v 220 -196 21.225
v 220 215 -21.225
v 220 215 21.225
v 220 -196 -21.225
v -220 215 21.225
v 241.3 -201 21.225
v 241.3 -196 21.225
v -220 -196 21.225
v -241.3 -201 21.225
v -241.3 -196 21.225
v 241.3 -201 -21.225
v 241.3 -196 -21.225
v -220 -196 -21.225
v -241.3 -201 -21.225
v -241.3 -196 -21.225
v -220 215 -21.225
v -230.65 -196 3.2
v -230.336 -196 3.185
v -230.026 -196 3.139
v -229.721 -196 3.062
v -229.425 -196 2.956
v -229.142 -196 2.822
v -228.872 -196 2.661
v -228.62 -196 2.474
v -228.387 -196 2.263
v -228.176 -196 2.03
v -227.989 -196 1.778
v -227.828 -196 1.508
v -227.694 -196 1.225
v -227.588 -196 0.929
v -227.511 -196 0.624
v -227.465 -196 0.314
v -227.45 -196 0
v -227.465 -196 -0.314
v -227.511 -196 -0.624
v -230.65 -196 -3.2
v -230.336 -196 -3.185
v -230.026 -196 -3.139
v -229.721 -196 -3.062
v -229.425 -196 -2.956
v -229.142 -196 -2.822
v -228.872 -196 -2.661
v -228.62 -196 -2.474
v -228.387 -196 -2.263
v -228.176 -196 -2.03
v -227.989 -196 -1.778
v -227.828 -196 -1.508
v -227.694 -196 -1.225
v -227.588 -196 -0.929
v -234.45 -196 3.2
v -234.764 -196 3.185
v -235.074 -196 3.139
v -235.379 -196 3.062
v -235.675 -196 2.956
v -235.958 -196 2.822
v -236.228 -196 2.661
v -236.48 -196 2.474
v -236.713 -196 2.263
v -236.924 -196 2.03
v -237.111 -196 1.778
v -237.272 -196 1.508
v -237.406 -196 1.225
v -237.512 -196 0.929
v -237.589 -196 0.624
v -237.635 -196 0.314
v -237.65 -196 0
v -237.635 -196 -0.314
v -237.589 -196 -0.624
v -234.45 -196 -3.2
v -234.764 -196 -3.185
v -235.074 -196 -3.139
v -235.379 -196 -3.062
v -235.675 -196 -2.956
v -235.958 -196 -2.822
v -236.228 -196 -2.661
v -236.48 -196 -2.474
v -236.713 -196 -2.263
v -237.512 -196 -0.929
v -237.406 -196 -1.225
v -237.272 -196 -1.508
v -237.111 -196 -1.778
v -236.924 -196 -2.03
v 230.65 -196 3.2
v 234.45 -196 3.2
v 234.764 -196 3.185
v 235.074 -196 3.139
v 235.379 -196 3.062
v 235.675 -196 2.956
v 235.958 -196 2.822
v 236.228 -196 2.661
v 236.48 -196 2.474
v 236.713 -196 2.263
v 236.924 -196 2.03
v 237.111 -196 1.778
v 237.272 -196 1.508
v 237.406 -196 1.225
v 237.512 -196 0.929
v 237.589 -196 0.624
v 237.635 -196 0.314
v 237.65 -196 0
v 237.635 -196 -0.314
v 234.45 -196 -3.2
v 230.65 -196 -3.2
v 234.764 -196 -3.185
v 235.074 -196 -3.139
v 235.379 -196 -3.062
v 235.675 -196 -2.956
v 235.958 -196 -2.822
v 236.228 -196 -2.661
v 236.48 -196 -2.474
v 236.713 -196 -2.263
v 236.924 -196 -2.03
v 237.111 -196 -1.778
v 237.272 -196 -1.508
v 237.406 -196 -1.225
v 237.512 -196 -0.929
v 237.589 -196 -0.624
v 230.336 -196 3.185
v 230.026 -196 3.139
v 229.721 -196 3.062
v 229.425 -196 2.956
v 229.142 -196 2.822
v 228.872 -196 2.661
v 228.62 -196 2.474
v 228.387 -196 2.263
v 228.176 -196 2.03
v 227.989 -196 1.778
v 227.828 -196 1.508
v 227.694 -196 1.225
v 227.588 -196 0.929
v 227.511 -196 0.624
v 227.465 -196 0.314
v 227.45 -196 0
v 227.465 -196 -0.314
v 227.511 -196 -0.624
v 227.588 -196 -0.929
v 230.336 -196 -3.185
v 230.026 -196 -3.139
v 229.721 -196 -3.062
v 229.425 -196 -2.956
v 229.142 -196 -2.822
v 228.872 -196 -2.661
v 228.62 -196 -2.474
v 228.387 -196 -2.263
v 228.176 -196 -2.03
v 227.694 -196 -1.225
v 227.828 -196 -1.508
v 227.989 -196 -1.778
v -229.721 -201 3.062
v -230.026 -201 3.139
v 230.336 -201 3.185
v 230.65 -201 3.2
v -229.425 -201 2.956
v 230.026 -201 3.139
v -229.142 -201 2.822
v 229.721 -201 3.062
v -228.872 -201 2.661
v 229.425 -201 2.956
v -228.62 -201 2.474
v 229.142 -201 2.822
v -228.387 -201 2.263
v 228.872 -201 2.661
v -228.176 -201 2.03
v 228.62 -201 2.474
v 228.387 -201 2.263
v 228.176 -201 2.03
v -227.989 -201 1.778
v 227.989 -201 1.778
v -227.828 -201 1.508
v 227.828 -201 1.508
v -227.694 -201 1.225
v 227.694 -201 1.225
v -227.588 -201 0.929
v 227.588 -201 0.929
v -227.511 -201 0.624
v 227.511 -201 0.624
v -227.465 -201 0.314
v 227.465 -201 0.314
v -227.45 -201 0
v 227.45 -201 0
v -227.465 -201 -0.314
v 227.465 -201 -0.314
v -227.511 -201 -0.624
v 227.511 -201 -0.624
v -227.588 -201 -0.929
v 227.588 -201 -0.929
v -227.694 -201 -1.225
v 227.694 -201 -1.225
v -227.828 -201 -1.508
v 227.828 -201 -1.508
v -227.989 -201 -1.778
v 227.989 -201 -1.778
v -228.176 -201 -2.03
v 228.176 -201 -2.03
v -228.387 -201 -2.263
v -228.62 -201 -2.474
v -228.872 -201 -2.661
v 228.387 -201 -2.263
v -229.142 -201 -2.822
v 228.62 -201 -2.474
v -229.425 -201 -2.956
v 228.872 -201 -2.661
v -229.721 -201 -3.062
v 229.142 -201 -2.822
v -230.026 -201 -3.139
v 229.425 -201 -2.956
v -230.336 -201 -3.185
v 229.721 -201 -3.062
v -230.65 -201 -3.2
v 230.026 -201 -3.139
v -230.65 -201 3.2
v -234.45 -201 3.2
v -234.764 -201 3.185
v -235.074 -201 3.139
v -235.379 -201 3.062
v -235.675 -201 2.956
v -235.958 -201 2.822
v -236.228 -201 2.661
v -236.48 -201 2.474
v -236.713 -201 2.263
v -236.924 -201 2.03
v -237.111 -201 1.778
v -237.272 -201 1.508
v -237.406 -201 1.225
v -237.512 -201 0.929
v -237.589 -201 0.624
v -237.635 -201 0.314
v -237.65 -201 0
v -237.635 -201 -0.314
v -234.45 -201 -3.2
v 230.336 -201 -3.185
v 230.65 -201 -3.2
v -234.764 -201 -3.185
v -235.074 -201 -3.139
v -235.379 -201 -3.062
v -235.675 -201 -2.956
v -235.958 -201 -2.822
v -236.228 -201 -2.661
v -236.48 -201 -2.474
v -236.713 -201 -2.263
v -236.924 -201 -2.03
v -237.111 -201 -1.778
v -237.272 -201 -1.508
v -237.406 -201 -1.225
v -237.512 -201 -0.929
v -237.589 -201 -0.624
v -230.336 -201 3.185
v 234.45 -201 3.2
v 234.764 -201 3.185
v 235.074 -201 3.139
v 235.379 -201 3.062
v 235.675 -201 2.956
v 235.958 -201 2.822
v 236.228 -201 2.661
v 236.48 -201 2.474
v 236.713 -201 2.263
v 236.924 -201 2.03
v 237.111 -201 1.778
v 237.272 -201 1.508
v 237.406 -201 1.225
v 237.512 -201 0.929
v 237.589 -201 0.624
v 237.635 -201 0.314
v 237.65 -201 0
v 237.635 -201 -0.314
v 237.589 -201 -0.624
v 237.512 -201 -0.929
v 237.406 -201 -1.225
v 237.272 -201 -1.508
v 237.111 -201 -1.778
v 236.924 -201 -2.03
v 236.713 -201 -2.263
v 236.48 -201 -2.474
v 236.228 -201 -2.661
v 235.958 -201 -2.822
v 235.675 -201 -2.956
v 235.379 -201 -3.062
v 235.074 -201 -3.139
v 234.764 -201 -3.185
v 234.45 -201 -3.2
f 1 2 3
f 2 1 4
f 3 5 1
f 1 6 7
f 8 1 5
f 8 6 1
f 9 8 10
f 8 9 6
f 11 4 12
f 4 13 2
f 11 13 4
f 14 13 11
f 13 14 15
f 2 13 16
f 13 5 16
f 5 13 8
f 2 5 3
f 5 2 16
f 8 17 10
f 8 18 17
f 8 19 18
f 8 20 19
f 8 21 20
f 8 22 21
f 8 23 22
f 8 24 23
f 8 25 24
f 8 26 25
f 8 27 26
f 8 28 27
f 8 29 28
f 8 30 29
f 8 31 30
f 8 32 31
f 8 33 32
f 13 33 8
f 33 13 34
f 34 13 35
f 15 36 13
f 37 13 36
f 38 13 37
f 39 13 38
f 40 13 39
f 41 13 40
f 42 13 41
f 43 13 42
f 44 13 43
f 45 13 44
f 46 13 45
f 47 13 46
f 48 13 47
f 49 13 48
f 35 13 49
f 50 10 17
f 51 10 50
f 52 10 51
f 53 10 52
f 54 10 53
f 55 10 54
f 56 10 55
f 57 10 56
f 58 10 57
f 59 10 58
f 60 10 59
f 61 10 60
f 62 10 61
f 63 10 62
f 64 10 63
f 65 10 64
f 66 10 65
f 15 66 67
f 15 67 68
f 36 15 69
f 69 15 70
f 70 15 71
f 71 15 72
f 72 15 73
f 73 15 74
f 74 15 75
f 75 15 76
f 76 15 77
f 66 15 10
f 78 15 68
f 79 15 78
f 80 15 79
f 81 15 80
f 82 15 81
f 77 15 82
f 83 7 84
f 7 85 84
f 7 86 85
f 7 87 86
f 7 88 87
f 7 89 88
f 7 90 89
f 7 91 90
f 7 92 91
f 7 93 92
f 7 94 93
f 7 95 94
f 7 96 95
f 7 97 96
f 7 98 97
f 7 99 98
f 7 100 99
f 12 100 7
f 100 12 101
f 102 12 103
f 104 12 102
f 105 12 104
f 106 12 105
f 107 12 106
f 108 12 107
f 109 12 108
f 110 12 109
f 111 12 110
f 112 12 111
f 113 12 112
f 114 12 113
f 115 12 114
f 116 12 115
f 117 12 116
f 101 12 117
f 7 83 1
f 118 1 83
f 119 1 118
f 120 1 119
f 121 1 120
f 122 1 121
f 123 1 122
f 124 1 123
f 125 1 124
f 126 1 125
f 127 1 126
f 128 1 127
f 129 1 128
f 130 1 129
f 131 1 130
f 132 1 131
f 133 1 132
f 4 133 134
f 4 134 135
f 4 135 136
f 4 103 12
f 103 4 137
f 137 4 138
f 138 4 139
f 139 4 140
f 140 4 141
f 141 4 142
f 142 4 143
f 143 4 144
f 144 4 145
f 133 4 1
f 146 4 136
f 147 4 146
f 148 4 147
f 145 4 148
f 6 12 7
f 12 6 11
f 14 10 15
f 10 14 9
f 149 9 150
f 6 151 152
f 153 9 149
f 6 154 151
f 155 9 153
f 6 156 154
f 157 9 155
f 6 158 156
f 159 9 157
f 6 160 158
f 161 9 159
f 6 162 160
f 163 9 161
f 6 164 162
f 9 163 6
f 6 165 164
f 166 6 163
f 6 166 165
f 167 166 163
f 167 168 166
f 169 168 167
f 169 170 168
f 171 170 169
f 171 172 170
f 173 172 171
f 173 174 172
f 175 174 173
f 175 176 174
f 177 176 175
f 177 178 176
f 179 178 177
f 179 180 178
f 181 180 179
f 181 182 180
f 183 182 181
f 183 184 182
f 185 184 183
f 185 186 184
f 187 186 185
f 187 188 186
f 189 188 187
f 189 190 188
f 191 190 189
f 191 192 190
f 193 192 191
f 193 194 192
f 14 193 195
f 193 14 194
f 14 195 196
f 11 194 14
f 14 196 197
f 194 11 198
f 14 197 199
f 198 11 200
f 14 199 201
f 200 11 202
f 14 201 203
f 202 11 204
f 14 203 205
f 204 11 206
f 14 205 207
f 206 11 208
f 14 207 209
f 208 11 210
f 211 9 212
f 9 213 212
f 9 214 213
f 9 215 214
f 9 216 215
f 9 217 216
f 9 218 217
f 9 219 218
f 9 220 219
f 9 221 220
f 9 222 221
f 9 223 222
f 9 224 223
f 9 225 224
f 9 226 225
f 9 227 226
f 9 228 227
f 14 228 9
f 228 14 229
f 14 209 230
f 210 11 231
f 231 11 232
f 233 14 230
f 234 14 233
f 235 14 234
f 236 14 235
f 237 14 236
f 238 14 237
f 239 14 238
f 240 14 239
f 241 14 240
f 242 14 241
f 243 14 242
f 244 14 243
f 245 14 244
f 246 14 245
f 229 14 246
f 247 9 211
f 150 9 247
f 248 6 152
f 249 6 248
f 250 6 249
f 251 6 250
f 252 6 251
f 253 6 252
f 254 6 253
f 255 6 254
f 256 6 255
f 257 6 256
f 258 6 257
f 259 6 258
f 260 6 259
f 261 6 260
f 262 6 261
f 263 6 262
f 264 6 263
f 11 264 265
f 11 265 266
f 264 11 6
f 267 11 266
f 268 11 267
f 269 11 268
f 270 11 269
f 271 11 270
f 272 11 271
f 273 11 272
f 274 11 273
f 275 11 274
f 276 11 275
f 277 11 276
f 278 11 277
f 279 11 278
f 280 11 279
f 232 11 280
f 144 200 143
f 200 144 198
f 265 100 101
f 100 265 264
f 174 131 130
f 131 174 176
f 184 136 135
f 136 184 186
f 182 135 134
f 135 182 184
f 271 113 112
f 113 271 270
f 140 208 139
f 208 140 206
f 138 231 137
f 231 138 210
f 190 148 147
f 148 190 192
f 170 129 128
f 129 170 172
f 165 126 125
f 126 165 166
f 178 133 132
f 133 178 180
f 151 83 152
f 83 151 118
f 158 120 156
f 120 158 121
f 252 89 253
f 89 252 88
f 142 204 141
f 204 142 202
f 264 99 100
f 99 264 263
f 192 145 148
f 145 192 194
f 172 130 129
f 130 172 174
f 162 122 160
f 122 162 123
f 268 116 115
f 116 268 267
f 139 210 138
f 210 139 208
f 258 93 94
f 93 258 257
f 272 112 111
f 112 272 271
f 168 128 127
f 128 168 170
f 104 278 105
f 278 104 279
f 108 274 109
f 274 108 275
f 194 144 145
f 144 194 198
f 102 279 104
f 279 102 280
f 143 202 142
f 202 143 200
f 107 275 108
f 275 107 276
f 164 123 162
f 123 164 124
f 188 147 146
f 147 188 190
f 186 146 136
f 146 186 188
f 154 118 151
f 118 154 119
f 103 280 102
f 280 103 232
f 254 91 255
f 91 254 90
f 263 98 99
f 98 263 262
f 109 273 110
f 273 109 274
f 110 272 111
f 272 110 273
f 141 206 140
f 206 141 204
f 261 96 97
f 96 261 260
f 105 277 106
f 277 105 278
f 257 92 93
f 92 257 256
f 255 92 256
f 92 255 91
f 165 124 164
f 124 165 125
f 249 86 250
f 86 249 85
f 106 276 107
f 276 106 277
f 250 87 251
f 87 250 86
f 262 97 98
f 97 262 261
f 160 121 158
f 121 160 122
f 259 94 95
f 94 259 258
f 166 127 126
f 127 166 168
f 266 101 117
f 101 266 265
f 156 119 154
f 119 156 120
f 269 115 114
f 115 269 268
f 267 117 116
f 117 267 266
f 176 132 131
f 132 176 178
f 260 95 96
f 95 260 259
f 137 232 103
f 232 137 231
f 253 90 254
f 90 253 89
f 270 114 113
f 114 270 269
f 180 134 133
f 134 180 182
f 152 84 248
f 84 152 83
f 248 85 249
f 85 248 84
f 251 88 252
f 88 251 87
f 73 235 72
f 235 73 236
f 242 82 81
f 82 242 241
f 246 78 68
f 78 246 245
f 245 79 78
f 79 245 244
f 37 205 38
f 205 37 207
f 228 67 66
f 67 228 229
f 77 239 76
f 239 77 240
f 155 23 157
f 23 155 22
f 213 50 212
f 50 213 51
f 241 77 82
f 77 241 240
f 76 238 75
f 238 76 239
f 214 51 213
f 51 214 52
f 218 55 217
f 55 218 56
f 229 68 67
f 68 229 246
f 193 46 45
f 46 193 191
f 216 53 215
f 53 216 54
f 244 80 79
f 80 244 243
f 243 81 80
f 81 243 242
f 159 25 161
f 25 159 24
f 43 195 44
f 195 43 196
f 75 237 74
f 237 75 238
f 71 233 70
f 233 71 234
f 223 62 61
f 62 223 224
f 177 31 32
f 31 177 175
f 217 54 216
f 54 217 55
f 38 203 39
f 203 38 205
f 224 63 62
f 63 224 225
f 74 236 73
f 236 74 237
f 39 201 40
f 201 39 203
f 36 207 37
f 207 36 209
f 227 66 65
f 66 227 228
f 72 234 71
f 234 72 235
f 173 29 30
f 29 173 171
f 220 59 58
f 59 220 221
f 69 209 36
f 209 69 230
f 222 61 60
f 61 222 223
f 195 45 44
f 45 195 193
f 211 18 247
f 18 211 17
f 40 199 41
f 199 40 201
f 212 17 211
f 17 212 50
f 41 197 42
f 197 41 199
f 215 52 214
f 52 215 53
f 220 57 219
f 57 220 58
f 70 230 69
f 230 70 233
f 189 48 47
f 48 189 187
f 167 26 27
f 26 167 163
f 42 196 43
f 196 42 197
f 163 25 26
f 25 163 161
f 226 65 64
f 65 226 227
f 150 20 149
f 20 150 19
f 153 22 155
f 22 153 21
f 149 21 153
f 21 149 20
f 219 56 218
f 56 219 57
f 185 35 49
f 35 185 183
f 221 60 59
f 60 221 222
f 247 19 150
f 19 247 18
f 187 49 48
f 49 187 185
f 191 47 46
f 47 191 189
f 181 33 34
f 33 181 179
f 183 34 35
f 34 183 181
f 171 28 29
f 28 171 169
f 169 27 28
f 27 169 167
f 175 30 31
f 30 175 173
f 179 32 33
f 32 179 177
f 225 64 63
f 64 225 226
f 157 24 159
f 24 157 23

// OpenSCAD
// ============================================================================
// Atom Lithography Machine — Parametric OpenSCAD Module (S2.3-04)
// ============================================================================
// part_id           : S2.3-04
// parent_bom_id     : S2.3
// subsystem         : S2
// part_name         : Cok-kanalli ultra-kararli mini-lens HV odak besleme kaynagi
// material          : Al 6061
// temp_stage        : 300 K (kabin)
// vacuum_grade      : Atmosfer
// tolerance         : ±5 ppm
// computed_mass_kg  : 5.26190
// envelope_mm       : 482.600 x 442.500 x 42.450
// design_maturity   : M0_M1_DETAILED_CAD_DESIGN_ONLY
// no_lab_measurement: true
// iec61508_certified: false
// semi_s2_certified : false
// Units: millimeters (mm)
// ============================================================================

$fn = 64;

// Nominal bounding envelope parameters (mm)
bbox_x = 482.6000;
bbox_y = 442.5000;
bbox_z = 42.4500;

// Part-specific parametric dimensions
rack_u = 1;
u_slot = "U30";
rails = 3;
v_rail_kV = 2.0;
ripple_mVpp = 2.0;

// Interface / port parameters (mm)
port_hv_rail1_out_od = 14.000;
port_hv_rail2_out_od = 14.000;
port_hv_rail3_out_od = 14.000;

module part_S2_3_04() {
  difference() {
    union() {
      // 1U hollow 19-in chassis body (width along X)
      translate([0.000, 9.500, 0.000]) cube([440.000, 411.000, 42.450], center=true);
      // EIA-310 19-in front panel w/ mounting ears facing -Y
      translate([0.000, -198.500, 0.000]) cube([482.600, 5.000, 42.450], center=true);
    }
    // EIA-310 +X rack slot
    translate([232.550, -198.500, 0.000]) rotate([90.000, 0.000, 0.000]) {
      hull() {
        translate([-1.900, 0, 0]) cylinder(d=6.400, h=9.000, center=true);
        translate([1.900, 0, 0]) cylinder(d=6.400, h=9.000, center=true);
      }
    }
    // EIA-310 -X rack slot
    translate([-232.550, -198.500, 0.000]) rotate([90.000, 0.000, 0.000]) {
      hull() {
        translate([-1.900, 0, 0]) cylinder(d=6.400, h=9.000, center=true);
        translate([1.900, 0, 0]) cylinder(d=6.400, h=9.000, center=true);
      }
    }
  }
}

// World assembly mounting transform (global machine frame, mm / deg):
// translate([1480.000, -223.000, 901.275]) rotate([0.000, 0.000, 0.000]) part_S2_3_04();

part_S2_3_04();
